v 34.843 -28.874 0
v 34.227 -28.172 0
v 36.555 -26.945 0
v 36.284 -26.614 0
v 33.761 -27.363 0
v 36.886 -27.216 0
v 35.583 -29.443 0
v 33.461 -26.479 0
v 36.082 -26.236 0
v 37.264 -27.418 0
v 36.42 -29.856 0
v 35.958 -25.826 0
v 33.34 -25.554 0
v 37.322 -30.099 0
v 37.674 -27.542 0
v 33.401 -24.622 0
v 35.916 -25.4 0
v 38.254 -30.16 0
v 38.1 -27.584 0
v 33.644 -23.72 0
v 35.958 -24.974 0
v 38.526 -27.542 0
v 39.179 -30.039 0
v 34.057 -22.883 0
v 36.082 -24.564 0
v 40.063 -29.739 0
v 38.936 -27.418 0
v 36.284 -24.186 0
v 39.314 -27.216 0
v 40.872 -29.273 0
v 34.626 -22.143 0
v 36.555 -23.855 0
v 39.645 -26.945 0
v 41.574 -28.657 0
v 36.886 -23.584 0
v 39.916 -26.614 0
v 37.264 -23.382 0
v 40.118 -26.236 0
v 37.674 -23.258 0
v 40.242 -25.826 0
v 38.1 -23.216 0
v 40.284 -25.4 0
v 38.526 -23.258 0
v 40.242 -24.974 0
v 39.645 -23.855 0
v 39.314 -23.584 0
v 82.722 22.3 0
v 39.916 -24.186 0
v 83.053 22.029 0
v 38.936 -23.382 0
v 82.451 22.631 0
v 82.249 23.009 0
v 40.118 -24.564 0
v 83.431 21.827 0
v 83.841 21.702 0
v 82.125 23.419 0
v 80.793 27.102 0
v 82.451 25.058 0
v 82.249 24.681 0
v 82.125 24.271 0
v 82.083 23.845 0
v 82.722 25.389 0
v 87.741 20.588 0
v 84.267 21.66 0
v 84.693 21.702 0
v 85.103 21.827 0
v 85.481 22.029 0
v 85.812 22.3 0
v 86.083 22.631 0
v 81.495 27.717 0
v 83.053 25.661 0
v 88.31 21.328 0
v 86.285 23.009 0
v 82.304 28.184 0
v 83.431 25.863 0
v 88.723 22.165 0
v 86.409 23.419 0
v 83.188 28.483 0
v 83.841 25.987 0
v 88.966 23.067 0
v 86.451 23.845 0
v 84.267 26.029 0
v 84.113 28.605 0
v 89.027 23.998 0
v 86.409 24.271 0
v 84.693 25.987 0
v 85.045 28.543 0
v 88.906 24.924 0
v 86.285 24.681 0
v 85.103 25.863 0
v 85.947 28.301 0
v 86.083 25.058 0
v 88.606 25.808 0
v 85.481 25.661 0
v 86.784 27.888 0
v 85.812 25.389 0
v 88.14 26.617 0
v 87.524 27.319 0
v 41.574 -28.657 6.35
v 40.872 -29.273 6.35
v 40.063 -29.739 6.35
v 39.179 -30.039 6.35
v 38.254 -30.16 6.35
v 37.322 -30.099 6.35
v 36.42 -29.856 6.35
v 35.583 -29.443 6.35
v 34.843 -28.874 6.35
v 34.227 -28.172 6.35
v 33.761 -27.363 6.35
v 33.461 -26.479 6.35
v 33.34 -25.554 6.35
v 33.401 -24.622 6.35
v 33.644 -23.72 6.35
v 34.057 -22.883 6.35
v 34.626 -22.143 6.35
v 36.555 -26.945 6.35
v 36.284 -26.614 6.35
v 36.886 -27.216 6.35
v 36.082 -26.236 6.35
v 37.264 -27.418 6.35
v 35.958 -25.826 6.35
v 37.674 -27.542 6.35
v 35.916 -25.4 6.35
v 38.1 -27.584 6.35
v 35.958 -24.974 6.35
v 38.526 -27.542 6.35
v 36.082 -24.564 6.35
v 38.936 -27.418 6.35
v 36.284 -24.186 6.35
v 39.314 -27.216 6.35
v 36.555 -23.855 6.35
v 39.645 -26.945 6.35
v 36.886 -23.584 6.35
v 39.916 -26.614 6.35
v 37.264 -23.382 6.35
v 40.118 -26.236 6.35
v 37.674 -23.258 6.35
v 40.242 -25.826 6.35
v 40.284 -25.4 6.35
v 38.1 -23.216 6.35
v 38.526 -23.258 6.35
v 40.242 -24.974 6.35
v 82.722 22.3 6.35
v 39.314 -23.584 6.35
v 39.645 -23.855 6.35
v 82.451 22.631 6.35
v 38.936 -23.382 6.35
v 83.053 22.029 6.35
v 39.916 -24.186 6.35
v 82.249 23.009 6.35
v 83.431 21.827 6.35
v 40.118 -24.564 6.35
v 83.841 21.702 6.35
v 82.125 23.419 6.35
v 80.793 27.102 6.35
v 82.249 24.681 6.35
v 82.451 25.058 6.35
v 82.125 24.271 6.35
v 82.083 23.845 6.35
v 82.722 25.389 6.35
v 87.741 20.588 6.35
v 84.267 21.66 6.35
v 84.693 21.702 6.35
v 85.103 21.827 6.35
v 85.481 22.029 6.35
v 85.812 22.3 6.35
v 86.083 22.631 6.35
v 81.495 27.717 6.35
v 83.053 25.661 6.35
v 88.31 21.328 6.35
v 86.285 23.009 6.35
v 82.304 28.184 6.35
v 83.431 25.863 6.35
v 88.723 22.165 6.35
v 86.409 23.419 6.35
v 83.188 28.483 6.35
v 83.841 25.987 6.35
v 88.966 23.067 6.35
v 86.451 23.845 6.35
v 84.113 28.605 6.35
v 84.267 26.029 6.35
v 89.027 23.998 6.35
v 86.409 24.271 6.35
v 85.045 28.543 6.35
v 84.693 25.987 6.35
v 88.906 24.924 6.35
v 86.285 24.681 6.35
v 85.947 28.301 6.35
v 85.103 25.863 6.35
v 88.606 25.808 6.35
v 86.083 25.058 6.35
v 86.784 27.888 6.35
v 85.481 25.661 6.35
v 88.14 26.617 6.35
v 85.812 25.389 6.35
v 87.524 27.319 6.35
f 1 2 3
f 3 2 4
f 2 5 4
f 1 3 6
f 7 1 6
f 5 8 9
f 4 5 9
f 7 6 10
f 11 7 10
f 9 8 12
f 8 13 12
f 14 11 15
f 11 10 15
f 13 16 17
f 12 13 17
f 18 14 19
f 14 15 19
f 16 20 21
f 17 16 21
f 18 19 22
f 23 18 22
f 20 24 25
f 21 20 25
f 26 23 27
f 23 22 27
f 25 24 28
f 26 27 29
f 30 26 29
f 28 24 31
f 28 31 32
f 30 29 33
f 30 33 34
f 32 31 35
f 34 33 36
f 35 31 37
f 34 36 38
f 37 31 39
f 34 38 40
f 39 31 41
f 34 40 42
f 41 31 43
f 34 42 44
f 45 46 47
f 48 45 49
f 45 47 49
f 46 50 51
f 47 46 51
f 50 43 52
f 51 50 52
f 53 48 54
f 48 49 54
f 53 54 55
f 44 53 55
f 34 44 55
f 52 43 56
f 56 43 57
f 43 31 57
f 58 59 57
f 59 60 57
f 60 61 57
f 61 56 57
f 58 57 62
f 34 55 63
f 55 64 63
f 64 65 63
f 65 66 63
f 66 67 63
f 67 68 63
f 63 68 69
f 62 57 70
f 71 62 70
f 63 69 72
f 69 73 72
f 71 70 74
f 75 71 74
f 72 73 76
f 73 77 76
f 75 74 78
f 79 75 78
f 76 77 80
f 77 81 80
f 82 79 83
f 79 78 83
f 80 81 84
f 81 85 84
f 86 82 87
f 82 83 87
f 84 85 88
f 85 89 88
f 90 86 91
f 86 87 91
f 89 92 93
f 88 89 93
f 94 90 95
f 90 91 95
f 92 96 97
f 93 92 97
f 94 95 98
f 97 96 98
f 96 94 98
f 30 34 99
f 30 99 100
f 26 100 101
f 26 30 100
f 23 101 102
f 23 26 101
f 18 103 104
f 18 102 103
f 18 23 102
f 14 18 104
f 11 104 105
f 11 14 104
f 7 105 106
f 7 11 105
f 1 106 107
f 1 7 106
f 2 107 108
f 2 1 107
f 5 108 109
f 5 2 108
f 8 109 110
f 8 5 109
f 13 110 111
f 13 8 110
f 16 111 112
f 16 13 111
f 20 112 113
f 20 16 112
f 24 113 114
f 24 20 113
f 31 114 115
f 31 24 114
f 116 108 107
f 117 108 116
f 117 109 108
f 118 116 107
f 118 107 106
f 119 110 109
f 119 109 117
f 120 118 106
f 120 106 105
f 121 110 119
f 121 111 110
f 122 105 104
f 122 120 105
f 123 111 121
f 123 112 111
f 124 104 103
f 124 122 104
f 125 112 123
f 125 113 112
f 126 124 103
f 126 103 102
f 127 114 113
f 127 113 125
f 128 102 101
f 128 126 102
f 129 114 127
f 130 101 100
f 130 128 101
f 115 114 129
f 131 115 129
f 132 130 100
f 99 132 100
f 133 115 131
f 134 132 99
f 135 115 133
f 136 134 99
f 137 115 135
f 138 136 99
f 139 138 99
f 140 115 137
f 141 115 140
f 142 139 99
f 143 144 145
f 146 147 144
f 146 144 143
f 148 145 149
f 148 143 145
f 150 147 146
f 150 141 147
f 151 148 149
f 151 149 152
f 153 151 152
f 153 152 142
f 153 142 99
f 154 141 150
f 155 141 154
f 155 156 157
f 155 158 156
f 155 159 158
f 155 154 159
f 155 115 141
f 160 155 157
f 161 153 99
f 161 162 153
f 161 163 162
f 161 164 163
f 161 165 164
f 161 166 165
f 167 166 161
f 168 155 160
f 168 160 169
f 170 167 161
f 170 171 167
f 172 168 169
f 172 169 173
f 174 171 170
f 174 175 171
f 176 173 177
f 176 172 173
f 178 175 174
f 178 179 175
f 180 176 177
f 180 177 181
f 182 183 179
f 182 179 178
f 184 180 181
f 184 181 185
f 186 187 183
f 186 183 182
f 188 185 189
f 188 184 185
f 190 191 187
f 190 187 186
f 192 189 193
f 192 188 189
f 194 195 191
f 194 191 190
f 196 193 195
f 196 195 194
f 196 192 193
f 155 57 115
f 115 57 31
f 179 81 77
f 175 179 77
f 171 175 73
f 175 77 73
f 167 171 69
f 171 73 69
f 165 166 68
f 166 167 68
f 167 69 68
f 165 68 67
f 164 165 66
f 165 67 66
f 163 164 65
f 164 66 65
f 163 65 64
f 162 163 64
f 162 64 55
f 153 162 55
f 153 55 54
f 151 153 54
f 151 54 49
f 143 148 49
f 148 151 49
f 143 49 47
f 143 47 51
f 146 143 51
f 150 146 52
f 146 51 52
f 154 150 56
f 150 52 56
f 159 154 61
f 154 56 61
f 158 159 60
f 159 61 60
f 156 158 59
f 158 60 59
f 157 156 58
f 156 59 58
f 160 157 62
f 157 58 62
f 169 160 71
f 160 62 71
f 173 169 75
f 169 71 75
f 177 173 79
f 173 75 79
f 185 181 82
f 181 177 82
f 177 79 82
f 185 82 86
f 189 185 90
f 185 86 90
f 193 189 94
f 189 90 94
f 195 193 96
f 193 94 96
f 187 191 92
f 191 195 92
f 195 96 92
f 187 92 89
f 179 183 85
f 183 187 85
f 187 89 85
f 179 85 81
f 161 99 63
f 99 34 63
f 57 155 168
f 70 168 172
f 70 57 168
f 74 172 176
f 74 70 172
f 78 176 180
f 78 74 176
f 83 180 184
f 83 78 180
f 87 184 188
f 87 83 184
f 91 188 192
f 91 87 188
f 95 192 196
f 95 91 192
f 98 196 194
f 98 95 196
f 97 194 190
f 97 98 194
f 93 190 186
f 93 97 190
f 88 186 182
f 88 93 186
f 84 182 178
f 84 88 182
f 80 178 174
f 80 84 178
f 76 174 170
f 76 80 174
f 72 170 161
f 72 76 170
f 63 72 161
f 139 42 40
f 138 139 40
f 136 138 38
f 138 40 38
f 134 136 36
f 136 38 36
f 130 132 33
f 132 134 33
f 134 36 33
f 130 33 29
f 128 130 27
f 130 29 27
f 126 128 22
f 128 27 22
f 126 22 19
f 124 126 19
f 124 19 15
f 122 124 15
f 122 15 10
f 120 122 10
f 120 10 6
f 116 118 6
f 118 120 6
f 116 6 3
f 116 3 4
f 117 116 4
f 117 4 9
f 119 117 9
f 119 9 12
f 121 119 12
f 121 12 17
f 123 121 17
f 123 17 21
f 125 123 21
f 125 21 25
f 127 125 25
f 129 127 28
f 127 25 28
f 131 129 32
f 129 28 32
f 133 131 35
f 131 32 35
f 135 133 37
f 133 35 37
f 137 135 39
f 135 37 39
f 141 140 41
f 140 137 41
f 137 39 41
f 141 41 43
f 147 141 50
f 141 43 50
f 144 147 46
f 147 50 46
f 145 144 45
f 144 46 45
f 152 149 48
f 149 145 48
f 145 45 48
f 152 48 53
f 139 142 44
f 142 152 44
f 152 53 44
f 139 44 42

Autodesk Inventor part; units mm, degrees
ref_plane "YZ Plane" through (0, 0, 0) normal (1, 0, 0) x (0, 1, 0)
ref_plane "XZ Plane" through (0, 0, 0) normal (0, 1, 0) x (-1, 0, 0)
ref_plane "XY Plane" through (0, 0, 0) normal (0, 0, 1) x (1, 0, 0)
sketch "Sketch1" plane through (0, 0, 0) normal (0, 0, 1) x (1, 0, 0)
  circle A0 centre (38.1, -25.4) radius 2.1844 projected
  circle A1 centre (84.267, 23.8448) radius 2.1844 projected
  circle A2 centre (38.1, -25.4) radius 4.7625
  circle A3 centre (84.267, 23.8448) radius 4.7625
  line L0 (80.7926, 27.1021) -> (31.2119, -25.784)
  line L1 (36.9187, -33.6234) -> (89.3053, 22.2556)
  point P0 (0, 0)
  point P1 (34.6256, -22.1427)
  point P2 (41.5744, -28.6573)
  point P3 (87.7414, 20.5875)
  dimension "d1" = 9.525
  dimension "d0" = 9.525
extrude "Extrusion1" add sketch "Sketch1" along normal blind 6.35
properties part number "thingy"
